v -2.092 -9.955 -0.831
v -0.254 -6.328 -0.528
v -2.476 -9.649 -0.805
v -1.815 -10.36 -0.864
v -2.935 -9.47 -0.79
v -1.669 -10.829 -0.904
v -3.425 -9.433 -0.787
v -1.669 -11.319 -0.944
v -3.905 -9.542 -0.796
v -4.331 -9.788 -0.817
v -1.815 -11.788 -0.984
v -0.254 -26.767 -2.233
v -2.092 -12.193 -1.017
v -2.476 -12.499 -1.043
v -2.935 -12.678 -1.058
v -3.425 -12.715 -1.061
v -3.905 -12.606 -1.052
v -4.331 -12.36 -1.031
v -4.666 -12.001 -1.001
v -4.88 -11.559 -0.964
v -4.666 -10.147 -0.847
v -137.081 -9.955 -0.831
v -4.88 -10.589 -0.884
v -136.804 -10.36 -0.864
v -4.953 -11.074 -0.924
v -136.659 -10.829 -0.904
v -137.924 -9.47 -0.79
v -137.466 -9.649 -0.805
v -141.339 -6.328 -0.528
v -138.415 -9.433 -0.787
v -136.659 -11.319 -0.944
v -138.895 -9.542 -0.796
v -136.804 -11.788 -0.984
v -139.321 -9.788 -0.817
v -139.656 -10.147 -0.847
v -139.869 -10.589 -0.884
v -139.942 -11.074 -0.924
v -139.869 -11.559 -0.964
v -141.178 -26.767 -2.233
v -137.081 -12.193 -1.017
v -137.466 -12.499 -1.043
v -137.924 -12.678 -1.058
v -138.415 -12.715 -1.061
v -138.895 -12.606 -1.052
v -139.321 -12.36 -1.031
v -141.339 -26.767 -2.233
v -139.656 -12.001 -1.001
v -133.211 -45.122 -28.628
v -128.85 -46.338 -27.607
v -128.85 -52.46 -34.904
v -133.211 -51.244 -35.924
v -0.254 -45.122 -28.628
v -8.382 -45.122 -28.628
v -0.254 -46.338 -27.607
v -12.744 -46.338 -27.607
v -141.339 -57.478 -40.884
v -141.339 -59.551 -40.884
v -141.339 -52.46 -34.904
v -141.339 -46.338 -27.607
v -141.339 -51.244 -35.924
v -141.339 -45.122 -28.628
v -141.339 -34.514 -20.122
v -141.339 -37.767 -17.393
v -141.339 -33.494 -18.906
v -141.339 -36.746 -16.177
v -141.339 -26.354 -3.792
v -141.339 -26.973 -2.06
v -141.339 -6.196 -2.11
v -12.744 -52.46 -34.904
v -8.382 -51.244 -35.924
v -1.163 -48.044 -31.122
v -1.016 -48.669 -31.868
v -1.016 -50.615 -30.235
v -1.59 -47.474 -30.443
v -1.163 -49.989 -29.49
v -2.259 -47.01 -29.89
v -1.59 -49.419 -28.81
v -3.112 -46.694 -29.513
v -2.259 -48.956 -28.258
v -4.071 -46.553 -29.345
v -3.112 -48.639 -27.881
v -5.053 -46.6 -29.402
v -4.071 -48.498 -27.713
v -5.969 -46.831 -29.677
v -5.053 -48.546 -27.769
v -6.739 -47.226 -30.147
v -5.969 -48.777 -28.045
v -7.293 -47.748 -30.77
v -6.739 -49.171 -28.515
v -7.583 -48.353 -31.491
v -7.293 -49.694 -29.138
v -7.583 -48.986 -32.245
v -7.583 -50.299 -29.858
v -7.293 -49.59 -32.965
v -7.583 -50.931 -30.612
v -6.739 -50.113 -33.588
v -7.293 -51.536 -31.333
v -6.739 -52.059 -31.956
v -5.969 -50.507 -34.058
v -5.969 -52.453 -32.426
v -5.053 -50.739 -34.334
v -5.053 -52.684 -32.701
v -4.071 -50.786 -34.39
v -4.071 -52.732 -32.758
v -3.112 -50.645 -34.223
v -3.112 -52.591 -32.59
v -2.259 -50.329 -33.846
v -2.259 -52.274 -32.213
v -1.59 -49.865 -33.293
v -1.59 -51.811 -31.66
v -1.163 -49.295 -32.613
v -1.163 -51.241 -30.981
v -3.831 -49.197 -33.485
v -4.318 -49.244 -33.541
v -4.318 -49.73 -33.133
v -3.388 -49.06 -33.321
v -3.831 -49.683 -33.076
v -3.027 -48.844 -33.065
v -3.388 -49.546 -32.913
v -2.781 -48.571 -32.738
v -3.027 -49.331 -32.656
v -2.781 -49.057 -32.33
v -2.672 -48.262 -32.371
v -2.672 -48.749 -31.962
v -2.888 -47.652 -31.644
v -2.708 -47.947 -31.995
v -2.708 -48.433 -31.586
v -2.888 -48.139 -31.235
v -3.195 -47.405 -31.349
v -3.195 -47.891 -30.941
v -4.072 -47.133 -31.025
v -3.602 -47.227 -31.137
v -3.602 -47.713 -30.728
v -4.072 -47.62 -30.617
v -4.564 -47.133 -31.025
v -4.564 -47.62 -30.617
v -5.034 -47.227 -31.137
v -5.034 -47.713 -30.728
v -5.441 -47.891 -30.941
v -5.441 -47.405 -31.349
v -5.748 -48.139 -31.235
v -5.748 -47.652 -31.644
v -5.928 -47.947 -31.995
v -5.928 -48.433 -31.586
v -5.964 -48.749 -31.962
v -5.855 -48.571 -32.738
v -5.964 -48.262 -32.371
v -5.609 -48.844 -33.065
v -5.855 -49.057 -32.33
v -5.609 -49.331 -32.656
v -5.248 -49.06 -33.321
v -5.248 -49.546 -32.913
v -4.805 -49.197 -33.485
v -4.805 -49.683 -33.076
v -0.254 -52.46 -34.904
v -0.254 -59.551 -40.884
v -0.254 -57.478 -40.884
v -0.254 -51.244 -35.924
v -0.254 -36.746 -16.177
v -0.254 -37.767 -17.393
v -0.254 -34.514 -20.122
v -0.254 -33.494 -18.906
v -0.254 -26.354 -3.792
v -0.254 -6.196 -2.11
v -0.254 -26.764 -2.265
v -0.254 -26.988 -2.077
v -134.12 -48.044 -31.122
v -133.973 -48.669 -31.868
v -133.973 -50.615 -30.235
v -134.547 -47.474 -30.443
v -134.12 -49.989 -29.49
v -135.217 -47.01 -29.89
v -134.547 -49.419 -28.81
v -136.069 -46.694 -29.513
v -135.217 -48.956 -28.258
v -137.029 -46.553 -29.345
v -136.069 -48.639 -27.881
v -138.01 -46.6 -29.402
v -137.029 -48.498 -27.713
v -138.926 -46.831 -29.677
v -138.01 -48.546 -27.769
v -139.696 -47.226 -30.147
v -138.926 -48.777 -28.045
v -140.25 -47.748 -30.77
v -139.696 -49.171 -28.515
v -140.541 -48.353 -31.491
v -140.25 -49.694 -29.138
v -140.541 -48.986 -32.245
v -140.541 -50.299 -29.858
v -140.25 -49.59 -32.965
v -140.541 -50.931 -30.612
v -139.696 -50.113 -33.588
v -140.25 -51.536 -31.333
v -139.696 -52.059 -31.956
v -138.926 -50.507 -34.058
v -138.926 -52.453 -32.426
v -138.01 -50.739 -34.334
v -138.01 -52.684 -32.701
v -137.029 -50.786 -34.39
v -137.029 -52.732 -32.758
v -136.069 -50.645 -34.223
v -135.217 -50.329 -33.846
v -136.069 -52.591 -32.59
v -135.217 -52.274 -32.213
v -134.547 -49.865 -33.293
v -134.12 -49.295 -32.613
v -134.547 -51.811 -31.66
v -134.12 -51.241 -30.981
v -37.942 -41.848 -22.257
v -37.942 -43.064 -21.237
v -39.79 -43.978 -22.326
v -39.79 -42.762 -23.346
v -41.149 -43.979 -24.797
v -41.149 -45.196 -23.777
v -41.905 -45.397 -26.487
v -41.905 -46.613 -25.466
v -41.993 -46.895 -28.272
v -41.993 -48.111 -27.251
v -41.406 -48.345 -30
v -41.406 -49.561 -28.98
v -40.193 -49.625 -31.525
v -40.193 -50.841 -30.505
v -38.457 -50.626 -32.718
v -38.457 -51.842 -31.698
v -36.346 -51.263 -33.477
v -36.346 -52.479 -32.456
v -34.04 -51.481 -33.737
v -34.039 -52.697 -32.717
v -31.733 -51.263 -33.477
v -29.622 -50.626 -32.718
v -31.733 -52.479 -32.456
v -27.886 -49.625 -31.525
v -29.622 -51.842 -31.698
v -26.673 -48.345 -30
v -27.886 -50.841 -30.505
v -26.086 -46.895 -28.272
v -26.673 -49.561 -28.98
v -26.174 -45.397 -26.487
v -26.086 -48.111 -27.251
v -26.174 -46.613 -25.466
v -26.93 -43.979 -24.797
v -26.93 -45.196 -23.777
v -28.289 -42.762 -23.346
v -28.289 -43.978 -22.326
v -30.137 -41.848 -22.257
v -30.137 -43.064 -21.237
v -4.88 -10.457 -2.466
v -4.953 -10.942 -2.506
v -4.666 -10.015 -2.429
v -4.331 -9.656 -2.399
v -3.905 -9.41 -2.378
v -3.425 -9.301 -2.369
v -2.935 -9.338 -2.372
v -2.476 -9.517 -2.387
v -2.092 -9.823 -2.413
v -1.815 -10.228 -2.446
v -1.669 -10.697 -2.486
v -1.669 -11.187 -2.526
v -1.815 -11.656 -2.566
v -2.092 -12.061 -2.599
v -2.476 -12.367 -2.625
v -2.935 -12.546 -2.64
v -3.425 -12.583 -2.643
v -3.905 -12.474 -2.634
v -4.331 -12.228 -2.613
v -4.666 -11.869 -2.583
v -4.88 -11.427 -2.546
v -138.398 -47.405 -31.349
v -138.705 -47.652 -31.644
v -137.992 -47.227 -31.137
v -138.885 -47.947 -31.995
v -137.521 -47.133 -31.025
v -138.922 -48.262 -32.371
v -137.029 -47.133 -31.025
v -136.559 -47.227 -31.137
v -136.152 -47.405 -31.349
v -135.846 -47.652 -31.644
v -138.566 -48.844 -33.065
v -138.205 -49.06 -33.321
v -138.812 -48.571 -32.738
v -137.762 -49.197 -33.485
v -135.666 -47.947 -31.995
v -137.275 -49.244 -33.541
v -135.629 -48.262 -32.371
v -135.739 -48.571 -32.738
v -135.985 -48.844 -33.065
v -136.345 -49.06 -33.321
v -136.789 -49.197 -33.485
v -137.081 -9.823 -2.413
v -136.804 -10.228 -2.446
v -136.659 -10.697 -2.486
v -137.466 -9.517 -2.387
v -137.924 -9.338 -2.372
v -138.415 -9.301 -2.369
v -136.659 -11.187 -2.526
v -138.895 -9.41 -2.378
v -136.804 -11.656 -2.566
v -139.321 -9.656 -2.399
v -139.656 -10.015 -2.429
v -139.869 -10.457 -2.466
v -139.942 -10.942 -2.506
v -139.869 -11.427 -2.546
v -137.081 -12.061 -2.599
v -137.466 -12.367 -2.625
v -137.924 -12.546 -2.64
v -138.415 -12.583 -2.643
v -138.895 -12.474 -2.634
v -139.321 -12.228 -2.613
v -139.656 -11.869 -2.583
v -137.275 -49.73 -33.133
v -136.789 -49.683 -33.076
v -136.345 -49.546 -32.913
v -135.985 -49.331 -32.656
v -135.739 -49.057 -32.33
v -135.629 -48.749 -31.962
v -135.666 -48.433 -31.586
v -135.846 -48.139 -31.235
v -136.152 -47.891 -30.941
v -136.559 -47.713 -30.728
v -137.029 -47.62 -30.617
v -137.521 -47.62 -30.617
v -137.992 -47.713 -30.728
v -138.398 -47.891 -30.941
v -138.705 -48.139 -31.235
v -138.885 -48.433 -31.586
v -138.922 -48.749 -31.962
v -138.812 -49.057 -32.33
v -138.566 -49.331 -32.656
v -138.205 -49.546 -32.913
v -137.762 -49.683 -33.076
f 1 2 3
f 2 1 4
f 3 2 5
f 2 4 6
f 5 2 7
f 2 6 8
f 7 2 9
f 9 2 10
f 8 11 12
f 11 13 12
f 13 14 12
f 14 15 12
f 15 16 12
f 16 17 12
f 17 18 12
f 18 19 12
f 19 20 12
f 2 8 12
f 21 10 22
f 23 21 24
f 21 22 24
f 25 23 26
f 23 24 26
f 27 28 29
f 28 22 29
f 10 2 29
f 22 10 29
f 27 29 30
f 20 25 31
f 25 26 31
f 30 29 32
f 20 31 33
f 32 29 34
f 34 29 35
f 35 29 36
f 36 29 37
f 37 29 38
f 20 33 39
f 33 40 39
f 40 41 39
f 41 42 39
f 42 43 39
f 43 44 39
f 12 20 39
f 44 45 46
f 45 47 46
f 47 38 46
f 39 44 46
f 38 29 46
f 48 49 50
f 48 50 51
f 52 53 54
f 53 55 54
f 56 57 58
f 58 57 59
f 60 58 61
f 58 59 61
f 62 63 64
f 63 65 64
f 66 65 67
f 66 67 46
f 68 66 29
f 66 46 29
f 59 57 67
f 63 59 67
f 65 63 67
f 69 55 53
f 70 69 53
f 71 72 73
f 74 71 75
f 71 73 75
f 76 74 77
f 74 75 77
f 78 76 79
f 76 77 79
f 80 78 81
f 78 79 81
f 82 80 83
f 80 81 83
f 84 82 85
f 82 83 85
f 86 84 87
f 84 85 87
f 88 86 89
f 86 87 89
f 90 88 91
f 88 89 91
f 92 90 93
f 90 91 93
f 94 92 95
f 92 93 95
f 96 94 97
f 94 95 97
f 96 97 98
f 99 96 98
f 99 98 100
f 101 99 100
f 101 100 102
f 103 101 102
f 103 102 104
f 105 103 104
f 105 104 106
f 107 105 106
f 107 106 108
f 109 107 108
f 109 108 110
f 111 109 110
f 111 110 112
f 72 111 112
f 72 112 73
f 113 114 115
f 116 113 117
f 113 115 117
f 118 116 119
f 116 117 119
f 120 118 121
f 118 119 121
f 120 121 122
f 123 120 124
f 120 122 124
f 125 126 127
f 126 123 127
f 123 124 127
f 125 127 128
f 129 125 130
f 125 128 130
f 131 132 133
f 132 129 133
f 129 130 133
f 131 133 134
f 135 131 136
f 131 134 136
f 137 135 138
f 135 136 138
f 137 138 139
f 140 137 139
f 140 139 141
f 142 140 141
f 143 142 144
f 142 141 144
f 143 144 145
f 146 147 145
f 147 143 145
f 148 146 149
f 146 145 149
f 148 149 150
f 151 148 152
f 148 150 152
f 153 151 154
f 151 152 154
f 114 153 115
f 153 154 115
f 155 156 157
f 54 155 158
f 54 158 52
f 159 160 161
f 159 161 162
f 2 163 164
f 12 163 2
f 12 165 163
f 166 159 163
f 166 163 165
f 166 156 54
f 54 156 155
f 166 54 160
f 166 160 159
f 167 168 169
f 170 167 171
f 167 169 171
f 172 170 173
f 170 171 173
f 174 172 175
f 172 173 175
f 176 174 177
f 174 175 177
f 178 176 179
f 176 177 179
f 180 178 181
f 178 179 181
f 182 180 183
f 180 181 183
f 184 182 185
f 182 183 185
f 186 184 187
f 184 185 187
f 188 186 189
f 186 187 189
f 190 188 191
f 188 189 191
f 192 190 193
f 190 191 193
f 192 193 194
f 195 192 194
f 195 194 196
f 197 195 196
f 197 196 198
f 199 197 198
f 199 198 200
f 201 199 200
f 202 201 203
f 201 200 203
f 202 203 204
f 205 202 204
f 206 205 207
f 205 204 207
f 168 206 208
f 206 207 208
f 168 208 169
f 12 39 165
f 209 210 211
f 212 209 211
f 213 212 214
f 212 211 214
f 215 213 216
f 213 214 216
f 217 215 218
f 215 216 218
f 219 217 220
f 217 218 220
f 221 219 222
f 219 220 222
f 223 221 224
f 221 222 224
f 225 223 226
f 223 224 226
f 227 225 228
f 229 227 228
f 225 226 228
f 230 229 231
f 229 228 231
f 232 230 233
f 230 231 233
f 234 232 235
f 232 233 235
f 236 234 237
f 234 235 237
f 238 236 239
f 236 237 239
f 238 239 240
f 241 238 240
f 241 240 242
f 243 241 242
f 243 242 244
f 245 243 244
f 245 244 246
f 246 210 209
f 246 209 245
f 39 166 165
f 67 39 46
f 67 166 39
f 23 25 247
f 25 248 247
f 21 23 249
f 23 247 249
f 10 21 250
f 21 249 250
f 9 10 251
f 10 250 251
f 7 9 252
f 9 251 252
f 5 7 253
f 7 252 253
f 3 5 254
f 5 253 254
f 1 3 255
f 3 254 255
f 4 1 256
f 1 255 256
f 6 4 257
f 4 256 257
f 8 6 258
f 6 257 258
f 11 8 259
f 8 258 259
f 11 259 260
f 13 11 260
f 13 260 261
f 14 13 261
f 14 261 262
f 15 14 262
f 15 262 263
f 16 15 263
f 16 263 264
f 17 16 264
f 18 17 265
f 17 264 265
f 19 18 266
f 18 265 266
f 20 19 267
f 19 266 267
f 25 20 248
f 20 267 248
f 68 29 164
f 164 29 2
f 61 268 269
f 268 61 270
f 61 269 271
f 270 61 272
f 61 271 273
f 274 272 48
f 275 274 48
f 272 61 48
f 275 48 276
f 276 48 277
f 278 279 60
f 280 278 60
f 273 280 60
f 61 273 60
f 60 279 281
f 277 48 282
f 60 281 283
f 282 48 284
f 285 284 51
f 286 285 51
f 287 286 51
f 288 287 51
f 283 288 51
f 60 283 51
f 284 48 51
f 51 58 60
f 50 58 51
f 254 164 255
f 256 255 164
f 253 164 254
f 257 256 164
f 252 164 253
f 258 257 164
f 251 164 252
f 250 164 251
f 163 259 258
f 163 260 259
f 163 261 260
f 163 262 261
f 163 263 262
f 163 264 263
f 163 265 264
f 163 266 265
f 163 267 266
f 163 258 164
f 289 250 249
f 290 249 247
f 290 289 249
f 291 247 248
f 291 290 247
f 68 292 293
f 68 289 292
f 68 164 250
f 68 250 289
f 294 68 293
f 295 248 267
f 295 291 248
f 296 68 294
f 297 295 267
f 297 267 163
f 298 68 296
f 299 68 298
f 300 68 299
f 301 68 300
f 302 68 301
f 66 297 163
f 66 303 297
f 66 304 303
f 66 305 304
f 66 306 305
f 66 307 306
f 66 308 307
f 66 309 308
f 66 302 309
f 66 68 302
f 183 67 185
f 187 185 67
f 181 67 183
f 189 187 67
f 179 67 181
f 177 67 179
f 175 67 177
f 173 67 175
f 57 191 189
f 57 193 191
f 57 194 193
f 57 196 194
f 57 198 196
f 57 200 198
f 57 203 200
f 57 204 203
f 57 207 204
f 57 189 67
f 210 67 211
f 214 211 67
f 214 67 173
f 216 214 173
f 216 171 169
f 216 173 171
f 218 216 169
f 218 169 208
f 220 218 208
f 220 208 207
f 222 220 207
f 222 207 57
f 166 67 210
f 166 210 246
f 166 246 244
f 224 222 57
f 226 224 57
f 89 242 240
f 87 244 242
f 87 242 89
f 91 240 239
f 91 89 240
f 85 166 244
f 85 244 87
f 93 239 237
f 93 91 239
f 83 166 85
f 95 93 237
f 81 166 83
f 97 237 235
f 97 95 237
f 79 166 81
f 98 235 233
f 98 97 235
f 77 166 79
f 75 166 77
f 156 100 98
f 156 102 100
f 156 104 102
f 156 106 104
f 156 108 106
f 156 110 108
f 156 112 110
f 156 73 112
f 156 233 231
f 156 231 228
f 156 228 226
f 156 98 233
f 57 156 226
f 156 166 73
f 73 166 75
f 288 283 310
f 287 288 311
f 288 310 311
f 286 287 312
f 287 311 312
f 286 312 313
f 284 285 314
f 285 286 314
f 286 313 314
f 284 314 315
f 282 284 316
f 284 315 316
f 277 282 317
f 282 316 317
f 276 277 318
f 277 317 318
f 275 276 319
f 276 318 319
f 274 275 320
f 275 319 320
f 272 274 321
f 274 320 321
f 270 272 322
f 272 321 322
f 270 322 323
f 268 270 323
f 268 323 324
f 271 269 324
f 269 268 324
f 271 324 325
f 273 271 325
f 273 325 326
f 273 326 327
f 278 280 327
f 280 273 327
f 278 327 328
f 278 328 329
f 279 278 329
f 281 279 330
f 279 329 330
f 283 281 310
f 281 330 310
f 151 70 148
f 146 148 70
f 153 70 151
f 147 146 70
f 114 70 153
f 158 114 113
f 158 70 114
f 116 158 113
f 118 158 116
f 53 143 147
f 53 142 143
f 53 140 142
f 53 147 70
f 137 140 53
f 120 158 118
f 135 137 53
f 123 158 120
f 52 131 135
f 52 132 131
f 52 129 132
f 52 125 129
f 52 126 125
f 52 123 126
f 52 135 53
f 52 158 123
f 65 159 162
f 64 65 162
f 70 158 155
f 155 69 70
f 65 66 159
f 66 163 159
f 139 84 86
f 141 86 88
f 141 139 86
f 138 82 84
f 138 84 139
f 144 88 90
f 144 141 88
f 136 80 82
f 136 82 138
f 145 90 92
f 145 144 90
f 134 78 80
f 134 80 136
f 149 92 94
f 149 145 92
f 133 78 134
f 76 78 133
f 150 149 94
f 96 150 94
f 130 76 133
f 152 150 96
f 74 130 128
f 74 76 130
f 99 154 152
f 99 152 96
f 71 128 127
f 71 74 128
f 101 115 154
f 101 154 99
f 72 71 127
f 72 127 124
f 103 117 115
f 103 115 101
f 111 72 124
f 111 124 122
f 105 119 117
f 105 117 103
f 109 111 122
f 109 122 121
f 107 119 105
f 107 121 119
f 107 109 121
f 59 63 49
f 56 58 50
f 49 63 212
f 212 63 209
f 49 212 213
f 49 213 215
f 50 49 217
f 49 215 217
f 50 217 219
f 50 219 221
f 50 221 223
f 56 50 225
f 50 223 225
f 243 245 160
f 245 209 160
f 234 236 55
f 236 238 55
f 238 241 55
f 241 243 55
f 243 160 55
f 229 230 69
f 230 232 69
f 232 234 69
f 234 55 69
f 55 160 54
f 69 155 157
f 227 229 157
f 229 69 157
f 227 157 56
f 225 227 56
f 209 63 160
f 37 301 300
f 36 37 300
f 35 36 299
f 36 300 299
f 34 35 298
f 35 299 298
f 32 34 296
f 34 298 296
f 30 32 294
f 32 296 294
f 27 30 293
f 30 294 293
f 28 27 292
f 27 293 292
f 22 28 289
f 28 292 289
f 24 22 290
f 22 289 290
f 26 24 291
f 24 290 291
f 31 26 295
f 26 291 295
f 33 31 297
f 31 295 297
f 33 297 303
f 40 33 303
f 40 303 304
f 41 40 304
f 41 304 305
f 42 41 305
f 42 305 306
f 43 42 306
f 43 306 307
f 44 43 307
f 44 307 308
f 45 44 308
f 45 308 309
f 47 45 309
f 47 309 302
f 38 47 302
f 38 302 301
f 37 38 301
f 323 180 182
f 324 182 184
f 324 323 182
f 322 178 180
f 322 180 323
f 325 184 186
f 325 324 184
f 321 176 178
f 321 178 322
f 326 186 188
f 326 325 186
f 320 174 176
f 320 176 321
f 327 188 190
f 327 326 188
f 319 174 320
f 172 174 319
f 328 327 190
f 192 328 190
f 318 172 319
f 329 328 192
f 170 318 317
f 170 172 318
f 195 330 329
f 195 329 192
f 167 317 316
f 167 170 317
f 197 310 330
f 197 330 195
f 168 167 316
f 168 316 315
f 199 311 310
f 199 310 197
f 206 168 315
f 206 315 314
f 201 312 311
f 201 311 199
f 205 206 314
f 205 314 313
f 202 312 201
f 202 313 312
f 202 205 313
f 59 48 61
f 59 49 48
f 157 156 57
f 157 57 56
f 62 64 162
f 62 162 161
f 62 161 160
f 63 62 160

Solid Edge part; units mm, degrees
sketch "Sketch1" plane through (0.7938, -13.3834, -1.1167) normal (0, -0.083149, 0.9965371) x (0, 0.9965371, 0.083149)
  line L0 (-13.43, 142.1332) -> (7.08, 142.1332)
  line L1 (7.08, 142.1332) -> (7.08, 1.0478)
  line L2 (7.08, 1.0478) -> (-13.43, 1.0478)
  line L3 (-13.43, 142.1332) -> (-13.43, 1.0478)
extrude "Protrusion1" add sketch "Sketch1" against normal blind 1.5875
sketch "Sketch2" plane through (-136.8309, -10.9401, -2.5058) normal (0, 0.083149, -0.9965371) x (-1, 0, 0)
  circle A0 centre (-133.5289, -0.0019) radius 1.651
  circle A1 centre (1.4605, -0.0019) radius 1.651
extrude "Cutout1" cut sketch "Sketch2" against normal through all
sketch "Sketch3" plane through (-142.3872, -43.3146, -21.5349) normal (0, -0.7660444, 0.6427876) x (0, 0.6427876, 0.7660444)
  line L0 (-25.4, -142.1332) -> (25.4, -142.1332)
  line L1 (25.4, -142.1332) -> (25.4225, -1.0478)
  line L2 (25.4225, -1.0478) -> (-25.4, -1.0478)
  line L3 (-25.4, -1.0478) -> (-25.4, -142.1332)
extrude "ExtrudedProtrusion_5" add sketch "Sketch3" against normal blind 1.5875
sketch "Sketch4" plane through (-0.254, -29.7685, -21.1109) normal (1, 0, 0) x (0, 0.9965371, 0.083149)
  line L0 (-33.0506, -58.6212) -> (-31.9669, -17.1746)
  line L1 (-31.9669, -17.1746) -> (-31.323, -17.2284)
  line L2 (-31.323, -17.2284) -> (-29.2579, -17.4007)
  line L3 (-29.2579, -17.4007) -> (-33.0506, -58.6212)
extrude "Cutout2" cut sketch "Sketch4" against normal through all
sketch "Sketch5" plane through (-70.7967, -41.8719, -22.2853) normal (0, 0.7660444, -0.6427876) x (0, -0.6427876, -0.7660444)
  line L0 (16.4724, 70.5427) -> (16.4724, 62.4147)
  line L1 (16.4724, 62.4147) -> (6.9474, 62.4147)
  line L2 (6.9474, 62.4147) -> (6.9474, 70.5427)
  line L3 (6.9474, 70.5427) -> (16.4724, 70.5427)
  circle A0 centre (11.7099, 66.4787) radius 1.651
  line L4 (16.4724, -70.5427) -> (16.4724, -62.4147)
  line L5 (16.4724, -62.4147) -> (6.9474, -62.4147)
  line L6 (6.9474, -62.4147) -> (6.9474, -70.5427)
  line L7 (6.9474, -70.5427) -> (16.4724, -70.5427)
  circle A1 centre (11.7099, -66.4787) radius 1.651
extrude "Protrusion2" add sketch "Sketch5" along normal up to vertex (1.5875 mm away)
sketch "Sketch6" plane through (-70.7967, -43.304, -21.5222) normal (0, -0.7660444, 0.6427876) x (1, 0, 0)
  circle A0 centre (66.4787, -11.374) radius 3.302
  circle A1 centre (-66.4787, -11.374) radius 3.302
  dimension "D1" = 6.604
extrude "countersink_lower" cut sketch "Sketch6" against normal blind 2.54
sketch "Sketch7" plane through (-4.318, -51.6286, -35.6017) normal (0, -0.6427876, -0.7660444) x (-1, 0, 0)
  line L0 (8.4256, -1.0856) -> (4.064, 0.5019)
  line L1 (4.064, 0.5019) -> (4.064, -1.0856)
  line L2 (4.064, -1.0856) -> (8.4256, -1.0856)
  line L3 (124.5318, -1.0856) -> (128.8934, 0.5019)
  line L4 (128.8934, 0.5019) -> (128.8934, -1.0856)
  line L5 (128.8934, -1.0856) -> (124.5318, -1.0856)
extrude "Protrusion3" add sketch "Sketch7" against normal up to vertex (9.525 mm away)
sketch "Sketch8" plane through (-70.7967, -43.304, -21.5222) normal (0, -0.7660444, 0.6427876) x (1, 0, 0)
  arc A0 (40.6592, 0.3728) -> (32.8552, 0.3728) centre (36.7572, -6.6122) cw
  line L0 (32.8552, 0.3728) -> (40.6592, 0.3728)
extrude "Cutout3" cut sketch "Sketch8" against normal up to next
sketch "Sketch9" plane through (-141.3394, -32.8733, -20.7061) normal (-1, 0, 0) x (0, -0.6427876, -0.7660444)
  line L0 (-0.9804, 5.8783) -> (-0.9804, 1.6328)
  line L1 (-0.9804, 1.6328) -> (0.6071, 1.6328)
  line L2 (0.6071, 1.6328) -> (0.6071, 5.8783)
  line L3 (0.6071, 5.8783) -> (-0.9804, 5.8783)
extrude "Protrusion4" add sketch "Sketch9" against normal up to vertex (141.0854 mm away)
